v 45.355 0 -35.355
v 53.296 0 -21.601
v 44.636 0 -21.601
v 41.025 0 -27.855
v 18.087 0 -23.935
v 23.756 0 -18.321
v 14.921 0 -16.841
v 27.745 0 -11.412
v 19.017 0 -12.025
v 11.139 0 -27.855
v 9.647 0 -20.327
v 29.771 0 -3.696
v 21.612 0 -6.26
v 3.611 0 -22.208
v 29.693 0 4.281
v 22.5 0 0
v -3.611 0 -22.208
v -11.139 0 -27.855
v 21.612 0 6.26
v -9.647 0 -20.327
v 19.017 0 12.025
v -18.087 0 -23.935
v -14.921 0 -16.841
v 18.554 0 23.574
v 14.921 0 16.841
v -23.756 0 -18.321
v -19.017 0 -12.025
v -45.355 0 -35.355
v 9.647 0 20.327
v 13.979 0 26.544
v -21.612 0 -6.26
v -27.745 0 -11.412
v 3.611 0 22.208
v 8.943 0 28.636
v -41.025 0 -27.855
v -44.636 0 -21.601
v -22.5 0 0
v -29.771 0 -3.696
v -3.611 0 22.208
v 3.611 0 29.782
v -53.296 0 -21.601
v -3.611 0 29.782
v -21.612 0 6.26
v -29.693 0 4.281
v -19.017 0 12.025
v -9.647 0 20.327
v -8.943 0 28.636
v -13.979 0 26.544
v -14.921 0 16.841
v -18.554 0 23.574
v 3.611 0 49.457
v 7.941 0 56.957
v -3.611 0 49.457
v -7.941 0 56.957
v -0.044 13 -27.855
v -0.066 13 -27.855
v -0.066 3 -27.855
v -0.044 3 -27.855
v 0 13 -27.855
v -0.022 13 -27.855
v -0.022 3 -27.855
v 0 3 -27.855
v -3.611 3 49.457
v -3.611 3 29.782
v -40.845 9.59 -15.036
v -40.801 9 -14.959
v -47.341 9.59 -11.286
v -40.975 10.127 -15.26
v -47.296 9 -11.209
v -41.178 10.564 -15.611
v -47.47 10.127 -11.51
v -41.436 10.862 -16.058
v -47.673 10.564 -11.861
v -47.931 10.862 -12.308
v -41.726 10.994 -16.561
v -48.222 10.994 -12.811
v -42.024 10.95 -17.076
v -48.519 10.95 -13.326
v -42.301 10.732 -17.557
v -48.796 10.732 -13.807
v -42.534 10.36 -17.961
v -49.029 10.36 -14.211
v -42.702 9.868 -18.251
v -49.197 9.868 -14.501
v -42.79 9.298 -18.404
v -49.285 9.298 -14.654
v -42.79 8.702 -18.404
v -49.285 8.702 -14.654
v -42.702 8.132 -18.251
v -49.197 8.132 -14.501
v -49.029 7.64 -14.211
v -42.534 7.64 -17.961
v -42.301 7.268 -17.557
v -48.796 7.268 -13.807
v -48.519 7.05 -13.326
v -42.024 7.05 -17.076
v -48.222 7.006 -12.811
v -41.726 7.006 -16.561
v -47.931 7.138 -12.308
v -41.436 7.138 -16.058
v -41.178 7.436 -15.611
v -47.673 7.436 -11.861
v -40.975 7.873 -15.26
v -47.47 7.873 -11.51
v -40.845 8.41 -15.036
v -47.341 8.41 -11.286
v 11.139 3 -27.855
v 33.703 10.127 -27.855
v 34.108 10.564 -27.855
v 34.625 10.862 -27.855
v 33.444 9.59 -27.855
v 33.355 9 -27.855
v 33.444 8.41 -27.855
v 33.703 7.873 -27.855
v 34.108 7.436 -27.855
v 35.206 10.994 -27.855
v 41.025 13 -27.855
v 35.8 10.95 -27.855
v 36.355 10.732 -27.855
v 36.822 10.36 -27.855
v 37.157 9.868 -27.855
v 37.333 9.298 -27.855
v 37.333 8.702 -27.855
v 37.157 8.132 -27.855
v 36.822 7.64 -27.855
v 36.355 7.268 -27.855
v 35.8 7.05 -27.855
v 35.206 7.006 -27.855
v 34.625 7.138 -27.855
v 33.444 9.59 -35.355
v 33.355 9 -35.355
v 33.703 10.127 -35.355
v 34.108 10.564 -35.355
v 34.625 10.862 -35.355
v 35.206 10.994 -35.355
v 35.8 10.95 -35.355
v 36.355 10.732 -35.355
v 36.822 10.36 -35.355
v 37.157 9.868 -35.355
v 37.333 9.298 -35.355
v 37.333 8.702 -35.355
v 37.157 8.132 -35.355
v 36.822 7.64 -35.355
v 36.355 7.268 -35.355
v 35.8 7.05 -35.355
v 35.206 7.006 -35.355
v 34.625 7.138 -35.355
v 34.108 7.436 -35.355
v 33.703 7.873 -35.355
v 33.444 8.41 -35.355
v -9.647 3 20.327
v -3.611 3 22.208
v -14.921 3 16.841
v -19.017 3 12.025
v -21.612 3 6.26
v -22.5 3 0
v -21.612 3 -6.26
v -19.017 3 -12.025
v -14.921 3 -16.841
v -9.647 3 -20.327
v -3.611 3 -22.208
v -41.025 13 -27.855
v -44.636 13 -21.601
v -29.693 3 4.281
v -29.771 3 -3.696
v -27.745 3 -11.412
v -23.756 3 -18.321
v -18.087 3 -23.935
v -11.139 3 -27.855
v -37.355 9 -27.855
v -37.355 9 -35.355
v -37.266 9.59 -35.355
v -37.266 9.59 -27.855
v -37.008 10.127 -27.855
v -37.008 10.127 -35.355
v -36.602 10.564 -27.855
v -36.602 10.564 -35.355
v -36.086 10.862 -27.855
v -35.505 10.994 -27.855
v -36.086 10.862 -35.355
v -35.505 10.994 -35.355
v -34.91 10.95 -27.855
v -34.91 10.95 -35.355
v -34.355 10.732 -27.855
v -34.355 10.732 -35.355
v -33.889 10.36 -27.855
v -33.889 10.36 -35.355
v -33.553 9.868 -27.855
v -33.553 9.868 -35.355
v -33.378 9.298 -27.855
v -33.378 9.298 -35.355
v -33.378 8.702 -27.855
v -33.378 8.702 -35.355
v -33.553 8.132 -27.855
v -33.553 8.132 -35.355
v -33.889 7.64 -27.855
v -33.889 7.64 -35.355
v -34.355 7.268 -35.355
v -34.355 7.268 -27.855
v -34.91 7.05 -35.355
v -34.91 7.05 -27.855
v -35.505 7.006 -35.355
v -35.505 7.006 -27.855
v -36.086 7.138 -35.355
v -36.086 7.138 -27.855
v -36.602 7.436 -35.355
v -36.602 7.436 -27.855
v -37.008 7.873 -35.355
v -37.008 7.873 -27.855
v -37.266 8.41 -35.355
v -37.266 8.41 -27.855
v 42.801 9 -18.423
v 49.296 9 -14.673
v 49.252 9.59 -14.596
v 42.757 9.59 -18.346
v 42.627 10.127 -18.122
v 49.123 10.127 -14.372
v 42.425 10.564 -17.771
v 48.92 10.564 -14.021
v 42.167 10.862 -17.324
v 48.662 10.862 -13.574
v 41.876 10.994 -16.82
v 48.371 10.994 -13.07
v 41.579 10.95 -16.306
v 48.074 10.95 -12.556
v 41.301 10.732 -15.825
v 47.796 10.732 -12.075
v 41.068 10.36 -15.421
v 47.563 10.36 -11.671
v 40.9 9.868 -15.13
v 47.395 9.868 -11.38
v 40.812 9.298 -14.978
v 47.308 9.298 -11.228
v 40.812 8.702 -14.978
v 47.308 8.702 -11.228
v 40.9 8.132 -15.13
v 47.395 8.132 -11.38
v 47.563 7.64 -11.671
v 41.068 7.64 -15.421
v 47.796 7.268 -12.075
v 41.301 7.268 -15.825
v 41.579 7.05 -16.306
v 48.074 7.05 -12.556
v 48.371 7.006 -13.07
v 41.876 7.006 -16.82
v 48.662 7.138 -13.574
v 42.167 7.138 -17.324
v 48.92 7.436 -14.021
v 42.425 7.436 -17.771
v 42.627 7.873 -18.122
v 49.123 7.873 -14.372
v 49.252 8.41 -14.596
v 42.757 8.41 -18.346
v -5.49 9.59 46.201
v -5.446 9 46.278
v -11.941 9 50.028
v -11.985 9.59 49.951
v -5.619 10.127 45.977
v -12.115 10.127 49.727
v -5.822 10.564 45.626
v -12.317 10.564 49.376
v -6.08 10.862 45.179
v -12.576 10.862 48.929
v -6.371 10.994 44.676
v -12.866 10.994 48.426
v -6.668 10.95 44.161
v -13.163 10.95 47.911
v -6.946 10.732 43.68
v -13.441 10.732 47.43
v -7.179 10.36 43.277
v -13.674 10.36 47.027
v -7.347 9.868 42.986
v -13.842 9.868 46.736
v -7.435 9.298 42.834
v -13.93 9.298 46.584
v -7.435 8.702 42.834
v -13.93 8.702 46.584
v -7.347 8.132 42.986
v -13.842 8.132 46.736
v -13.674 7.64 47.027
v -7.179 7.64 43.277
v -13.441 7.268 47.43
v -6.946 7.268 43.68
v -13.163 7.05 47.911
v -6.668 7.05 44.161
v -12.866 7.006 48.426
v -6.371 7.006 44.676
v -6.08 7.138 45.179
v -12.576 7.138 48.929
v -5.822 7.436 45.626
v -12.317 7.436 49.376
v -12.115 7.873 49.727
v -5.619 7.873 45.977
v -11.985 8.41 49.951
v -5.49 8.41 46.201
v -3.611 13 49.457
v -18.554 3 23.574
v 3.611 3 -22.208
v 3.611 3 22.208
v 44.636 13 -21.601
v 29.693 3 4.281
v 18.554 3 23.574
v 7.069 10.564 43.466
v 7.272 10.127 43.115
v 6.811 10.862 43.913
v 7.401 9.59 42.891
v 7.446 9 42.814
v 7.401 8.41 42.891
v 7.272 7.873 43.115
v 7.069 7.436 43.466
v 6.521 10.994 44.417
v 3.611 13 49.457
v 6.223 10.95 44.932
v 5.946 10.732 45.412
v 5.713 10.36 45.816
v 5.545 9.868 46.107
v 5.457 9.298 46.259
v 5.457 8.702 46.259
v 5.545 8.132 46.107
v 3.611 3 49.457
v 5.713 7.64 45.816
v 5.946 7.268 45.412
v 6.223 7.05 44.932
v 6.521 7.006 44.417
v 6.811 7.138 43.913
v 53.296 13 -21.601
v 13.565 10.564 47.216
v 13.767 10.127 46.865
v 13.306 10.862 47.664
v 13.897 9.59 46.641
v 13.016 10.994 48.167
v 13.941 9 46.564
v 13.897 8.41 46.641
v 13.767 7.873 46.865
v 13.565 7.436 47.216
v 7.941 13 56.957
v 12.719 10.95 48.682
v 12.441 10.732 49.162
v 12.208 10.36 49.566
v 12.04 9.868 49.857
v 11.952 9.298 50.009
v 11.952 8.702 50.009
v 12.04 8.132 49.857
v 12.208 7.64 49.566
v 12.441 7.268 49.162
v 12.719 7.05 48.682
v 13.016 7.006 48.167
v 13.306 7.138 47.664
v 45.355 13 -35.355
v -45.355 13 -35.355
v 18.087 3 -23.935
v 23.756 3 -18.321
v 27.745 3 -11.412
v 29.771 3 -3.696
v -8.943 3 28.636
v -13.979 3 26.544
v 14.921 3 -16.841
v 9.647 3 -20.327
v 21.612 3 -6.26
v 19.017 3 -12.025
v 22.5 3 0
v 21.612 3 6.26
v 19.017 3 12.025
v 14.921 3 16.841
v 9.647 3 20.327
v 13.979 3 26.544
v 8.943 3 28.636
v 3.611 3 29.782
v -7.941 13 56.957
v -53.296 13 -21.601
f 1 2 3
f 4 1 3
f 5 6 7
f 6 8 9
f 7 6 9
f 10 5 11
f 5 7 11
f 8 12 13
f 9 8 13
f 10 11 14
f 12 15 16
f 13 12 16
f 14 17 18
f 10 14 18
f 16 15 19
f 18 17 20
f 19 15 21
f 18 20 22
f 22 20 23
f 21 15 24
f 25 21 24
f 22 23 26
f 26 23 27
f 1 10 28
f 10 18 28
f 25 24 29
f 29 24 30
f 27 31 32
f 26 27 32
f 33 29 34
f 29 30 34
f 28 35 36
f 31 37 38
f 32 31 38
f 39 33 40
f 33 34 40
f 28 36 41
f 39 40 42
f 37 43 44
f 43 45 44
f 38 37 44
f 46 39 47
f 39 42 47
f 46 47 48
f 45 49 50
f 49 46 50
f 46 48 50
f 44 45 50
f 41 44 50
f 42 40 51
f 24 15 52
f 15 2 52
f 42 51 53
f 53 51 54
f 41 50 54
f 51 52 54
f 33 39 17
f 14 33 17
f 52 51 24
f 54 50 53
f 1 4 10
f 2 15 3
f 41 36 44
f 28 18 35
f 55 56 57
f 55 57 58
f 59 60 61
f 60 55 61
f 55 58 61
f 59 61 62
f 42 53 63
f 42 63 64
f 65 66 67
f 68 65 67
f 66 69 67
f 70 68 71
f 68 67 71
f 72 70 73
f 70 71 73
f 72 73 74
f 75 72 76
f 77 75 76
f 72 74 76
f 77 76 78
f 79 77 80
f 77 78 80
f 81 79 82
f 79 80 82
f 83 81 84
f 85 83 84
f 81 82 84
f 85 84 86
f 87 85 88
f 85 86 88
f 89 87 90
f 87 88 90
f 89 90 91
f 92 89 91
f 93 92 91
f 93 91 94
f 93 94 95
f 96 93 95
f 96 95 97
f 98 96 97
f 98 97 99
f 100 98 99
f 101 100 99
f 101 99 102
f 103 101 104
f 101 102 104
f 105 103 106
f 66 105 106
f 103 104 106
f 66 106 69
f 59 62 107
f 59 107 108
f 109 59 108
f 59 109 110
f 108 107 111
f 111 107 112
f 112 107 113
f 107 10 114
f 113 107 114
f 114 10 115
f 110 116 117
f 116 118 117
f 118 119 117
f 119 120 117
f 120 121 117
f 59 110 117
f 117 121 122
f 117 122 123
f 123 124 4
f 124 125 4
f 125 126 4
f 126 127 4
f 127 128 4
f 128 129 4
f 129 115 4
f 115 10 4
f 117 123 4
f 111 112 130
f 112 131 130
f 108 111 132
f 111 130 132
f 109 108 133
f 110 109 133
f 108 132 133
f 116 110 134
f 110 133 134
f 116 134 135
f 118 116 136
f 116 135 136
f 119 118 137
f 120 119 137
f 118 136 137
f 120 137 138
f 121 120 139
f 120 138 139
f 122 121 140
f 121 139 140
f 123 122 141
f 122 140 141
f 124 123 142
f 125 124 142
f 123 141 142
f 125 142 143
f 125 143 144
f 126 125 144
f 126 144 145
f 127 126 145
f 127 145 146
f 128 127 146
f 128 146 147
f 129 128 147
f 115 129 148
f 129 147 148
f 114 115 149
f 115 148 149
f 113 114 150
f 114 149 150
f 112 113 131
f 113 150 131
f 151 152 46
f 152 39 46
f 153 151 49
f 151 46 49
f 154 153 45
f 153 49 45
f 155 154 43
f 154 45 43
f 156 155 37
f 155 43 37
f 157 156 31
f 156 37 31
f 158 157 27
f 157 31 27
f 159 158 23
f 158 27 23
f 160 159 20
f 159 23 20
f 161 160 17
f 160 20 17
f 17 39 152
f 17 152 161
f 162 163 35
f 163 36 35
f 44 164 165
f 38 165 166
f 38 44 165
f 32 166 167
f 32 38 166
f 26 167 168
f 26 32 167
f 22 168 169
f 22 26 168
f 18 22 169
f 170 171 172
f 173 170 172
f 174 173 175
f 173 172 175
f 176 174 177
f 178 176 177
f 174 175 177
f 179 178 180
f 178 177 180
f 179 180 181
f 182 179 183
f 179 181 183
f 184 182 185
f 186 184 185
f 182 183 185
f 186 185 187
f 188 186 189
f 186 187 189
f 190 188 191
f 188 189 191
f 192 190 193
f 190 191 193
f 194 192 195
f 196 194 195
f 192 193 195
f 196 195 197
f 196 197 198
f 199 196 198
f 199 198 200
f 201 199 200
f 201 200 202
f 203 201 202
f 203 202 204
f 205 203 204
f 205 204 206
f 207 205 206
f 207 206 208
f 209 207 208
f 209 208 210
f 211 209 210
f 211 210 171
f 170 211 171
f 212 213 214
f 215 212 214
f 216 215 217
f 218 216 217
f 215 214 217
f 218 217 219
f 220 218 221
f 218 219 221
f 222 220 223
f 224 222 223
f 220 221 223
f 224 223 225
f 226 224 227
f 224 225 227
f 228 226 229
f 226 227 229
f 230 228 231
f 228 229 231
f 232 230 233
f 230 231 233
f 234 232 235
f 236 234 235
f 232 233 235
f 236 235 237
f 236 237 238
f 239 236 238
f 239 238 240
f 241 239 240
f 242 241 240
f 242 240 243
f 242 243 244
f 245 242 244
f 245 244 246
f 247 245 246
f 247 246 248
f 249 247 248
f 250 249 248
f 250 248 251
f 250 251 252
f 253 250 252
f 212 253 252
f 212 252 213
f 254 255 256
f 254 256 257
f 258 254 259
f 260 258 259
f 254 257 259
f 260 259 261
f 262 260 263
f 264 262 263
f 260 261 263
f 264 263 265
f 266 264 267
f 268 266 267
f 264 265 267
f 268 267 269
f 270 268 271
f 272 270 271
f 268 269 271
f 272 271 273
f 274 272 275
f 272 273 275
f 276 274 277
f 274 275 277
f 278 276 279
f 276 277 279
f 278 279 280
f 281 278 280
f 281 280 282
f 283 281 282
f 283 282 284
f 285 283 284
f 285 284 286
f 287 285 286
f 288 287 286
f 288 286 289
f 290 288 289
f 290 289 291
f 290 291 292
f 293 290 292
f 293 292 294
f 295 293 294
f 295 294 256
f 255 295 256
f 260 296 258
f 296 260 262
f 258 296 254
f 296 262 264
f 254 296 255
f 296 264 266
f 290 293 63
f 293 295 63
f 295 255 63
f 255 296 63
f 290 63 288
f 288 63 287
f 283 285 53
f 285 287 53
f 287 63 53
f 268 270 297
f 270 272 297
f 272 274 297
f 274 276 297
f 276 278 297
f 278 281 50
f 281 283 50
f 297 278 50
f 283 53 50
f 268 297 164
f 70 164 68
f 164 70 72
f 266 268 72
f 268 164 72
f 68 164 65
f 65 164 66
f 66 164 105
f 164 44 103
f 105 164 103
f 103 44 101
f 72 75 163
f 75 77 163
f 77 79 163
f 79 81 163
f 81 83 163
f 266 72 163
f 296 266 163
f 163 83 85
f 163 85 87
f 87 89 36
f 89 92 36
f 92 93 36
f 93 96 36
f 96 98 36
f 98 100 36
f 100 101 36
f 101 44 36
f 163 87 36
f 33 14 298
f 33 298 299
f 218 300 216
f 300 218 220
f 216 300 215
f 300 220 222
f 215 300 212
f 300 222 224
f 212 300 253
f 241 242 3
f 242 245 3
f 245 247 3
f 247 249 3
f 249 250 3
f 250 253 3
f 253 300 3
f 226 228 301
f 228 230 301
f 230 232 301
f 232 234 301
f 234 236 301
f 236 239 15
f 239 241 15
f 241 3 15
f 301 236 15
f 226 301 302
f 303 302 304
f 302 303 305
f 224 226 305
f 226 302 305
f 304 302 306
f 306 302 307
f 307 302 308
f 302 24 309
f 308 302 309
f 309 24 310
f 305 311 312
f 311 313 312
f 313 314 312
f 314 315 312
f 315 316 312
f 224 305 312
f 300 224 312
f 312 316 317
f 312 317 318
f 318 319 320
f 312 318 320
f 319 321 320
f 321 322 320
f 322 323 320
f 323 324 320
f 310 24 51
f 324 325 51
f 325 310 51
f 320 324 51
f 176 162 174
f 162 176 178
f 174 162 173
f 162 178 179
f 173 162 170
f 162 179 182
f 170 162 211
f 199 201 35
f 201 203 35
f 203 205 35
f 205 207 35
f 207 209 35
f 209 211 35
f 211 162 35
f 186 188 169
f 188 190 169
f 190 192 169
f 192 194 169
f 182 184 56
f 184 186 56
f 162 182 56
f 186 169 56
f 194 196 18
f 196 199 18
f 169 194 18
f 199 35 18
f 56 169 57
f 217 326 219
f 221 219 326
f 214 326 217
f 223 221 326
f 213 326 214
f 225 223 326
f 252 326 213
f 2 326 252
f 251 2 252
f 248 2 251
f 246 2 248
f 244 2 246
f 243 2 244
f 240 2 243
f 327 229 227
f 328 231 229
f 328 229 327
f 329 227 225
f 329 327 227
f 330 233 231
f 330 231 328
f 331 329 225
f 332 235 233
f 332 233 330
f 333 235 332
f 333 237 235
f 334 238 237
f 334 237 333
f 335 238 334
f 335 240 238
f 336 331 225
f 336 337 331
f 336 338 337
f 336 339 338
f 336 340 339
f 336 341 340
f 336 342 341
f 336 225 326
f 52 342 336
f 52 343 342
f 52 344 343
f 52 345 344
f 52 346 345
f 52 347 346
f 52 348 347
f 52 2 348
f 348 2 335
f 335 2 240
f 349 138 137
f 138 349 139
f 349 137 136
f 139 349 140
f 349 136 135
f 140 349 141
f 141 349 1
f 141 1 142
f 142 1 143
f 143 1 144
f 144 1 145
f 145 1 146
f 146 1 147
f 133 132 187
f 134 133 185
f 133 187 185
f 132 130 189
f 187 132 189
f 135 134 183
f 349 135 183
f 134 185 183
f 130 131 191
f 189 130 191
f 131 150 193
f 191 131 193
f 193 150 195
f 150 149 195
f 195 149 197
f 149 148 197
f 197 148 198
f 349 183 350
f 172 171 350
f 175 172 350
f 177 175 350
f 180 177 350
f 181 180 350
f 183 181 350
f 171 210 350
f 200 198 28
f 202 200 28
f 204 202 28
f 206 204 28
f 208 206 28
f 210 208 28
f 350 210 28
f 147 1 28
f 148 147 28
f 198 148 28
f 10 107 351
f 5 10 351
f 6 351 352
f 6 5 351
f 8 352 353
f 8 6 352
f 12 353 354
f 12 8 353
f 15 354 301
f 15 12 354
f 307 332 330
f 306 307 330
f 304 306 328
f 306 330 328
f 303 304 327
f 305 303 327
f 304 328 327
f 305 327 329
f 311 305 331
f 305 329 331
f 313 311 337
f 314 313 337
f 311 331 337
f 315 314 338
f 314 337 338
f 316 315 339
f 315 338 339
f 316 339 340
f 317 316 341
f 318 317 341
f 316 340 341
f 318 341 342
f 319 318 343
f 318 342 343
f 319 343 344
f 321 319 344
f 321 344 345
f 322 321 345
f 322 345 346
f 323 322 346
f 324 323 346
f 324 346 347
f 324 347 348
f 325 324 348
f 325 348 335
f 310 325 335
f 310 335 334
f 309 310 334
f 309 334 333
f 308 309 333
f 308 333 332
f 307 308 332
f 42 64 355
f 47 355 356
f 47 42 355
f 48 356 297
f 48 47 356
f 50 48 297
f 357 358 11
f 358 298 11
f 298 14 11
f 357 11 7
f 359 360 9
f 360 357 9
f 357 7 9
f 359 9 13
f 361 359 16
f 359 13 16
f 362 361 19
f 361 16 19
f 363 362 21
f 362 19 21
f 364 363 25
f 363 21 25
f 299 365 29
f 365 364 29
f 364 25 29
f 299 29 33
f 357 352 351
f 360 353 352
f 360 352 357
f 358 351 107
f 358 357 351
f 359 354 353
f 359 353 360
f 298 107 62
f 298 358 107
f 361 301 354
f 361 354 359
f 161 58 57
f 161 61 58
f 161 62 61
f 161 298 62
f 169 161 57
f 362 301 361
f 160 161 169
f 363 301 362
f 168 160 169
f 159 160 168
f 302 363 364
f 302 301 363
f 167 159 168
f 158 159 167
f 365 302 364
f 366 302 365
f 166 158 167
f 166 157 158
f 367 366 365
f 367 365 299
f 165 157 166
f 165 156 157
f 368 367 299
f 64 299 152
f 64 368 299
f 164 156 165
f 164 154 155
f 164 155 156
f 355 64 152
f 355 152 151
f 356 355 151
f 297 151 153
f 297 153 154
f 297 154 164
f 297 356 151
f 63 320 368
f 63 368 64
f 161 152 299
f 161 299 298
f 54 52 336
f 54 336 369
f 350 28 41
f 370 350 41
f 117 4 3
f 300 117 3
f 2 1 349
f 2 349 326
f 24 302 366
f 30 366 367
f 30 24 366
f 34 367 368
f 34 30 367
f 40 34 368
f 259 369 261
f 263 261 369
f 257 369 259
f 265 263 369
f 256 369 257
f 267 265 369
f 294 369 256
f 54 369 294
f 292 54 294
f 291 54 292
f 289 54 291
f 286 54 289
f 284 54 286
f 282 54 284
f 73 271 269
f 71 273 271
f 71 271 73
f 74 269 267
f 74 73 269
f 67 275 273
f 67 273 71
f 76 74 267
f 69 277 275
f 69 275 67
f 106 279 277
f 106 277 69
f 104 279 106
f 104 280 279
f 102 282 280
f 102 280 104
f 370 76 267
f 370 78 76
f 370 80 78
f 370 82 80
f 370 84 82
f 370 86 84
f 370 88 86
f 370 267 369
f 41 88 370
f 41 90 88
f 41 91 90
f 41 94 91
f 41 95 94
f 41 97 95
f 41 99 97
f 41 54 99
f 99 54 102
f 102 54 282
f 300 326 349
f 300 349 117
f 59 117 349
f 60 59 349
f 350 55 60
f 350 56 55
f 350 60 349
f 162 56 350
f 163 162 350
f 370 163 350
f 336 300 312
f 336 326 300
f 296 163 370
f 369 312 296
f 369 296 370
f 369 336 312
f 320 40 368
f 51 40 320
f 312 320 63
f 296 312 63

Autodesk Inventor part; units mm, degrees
ref_plane "YZ Plane" through (0, 0, 0) normal (1, 0, 0) x (0, 1, 0)
ref_plane "XZ Plane" through (0, 0, 0) normal (0, 1, 0) x (-1, 0, 0)
ref_plane "XY Plane" through (0, 0, 0) normal (0, 0, 1) x (1, 0, 0)
sketch "Sketch1" plane through (0, 0, 0) normal (0, 1, 0) x (-1, 0, 0)
  circle A0 centre (0, 0) radius 50
  line L0 (35.3554, -35.3553) -> (42.8554, -35.3553) construction
  line L1 (48.2963, -12.941) -> (55.7963, -12.941) construction
  line L2 (12.9409, 48.2963) -> (20.4409, 48.2963) construction
  line L3 (-12.941, 48.2963) -> (-5.441, 48.2963) construction
  line L4 (-48.2963, -12.941) -> (-40.7963, -12.941) construction
  line L5 (-35.3553, -35.3553) -> (-27.8553, -35.3553) construction
  line L6 (45.3554, -35.3553) -> (53.2963, -21.6012)
  line L7 (-45.3554, -35.3553) -> (-53.2964, -21.6012)
  line L8 (-7.941, 56.9566) -> (7.9409, 56.9566)
  line L9 (7.9409, 56.9566) -> (53.2963, -21.6012)
  line L10 (-45.3554, -35.3553) -> (45.3554, -35.3553)
  line L11 (-53.2964, -21.6012) -> (-7.941, 56.9566)
  line L12 (44.636, -21.6012) -> (41.0252, -27.8553)
  line L13 (41.0252, -27.8553) -> (-41.0253, -27.8553)
  line L14 (-41.0253, -27.8553) -> (-44.6361, -21.6012)
  line L15 (-44.6361, -21.6012) -> (-3.6108, 49.4566)
  line L16 (-3.6108, 49.4566) -> (3.6108, 49.4566)
  line L17 (3.6108, 49.4566) -> (44.636, -21.6012)
  arc A1 (0, -27.8553) -> (0.0657, -27.8553) centre (0.0328, 0.0001) ccw
  circle A2 centre (0, 0) radius 22.5
  line L18 (3.6108, -27.8553) -> (-3.6108, -27.8553)
  line L19 (-3.6108, -27.8553) -> (-3.6108, 49.4566)
  line L20 (-3.6108, 49.4566) -> (3.6108, 49.4566)
  line L21 (3.6108, 49.4566) -> (3.6108, -27.8553)
  circle A3 centre (0, 0) radius 30
  point P0 (0, -27.8553)
  point P1 (0, -27.8553)
  point P2 (0, 49.4566)
  point P3 (0, 49.4566)
  dimension "d0" = 100
  dimension "d7" = 35.3553
  dimension "d9" = 12.941
  dimension "d10" = 48.2963
  dimension "d11" = 35.3553
  dimension "d12" = 35.3553
  dimension "d13" = 35.3554
  dimension "d17" = 12.941
  dimension "d18" = 48.2963
  dimension "d20" = 48.2963
  dimension "d21" = 12.9409
  dimension "d22" = 48.2963
  dimension "d23" = 12.941
  dimension "d99" = 7.5
  dimension "d133" = 2.5
  dimension "d134" = 15.8819
  dimension "d140" = 15.8819
  dimension "d143" = 15.8819
  dimension "d144" = 90.7107
  dimension "d145" = 90.7108
  dimension "d146" = 90.7107
  dimension "d147" = 35.3553
  dimension "d148" = 120
  dimension "d149" = 120
  dimension "d150" = 7.5
  dimension "d184" = 45
  dimension "d185" = 60
extrude "Extrusion5" add sketch "Sketch1" along normal blind 13 contours L9 A0 L10 L11 | A0 L11 L8 L9 | L9 L6 L10 A0 | A0 L10 L7 L11 | L17 A3 | A3 L13 | A3 L15
sketch "Sketch5" plane through (53.2964, 0, -21.6012) normal (0.866, 0, 0.5) x (0.5, 0, -0.866)
  circle A0 centre (-80.7107, 9) radius 2
  circle A1 centre (-10, 9) radius 2
  line L0 (-90.7107, 13) -> (0, 13) projected
  line L1 (-90.7107, 0) -> (-90.7107, 13) projected
  line L2 (0, 0) -> (0, 13) projected
  point P0 (-45.3554, 0)
  dimension "d155" = 4
  dimension "d156" = 4
  dimension "d157" = 4
  dimension "d158" = 10
  dimension "d159" = 10
sketch "Sketch6" plane through (-7.9409, 0, 56.9566) normal (-0.866, 0, 0.5) x (0.5, 0, 0.866)
  circle A0 centre (-80.7107, 9) radius 2
  circle A1 centre (-10, 9) radius 2
  line L0 (0, 0) -> (0, 13) projected
  line L1 (-90.7107, 13) -> (0, 13) projected
  line L2 (-90.7107, 0) -> (-90.7107, 13) projected
  point P0 (-45.3554, 0)
  dimension "d160" = 4
  dimension "d161" = 4
  dimension "d162" = 10
  dimension "d163" = 4
  dimension "d164" = 10
sketch "Sketch7" plane through (45.3554, 0, -35.3553) normal (0, 0, -1) x (-1, 0, 0)
  circle A0 centre (10, 9) radius 2
  circle A1 centre (80.7107, 9) radius 2
  line L0 (0, 13) -> (90.7107, 13) projected
  line L1 (0, 0) -> (0, 13) projected
  line L2 (90.7107, 0) -> (90.7107, 13) projected
  point P0 (45.3554, 0)
  dimension "d165" = 4
  dimension "d166" = 4
  dimension "d167" = 4
  dimension "d168" = 10
  dimension "d169" = 10
extrude "Extrusion6" cut sketch "Sketch5" against normal blind 7.5
extrude "Extrusion7" cut sketch "Sketch7" against normal blind 7.5
extrude "Extrusion8" cut sketch "Sketch6" against normal blind 7.5
extrude "Extrusion9" add sketch "Sketch1" along normal blind 3 contours A3 L13 L21 A2 L17 | L17 A3 | A3 L13 | L13 L19 A2 L21 | A3 L15 L19 A2 L13 | L21 A3 L19 L16 | L21 A2 L19 A3 | A2 L19 L21 | A3 L15
properties part number "Stewart_Platform"
